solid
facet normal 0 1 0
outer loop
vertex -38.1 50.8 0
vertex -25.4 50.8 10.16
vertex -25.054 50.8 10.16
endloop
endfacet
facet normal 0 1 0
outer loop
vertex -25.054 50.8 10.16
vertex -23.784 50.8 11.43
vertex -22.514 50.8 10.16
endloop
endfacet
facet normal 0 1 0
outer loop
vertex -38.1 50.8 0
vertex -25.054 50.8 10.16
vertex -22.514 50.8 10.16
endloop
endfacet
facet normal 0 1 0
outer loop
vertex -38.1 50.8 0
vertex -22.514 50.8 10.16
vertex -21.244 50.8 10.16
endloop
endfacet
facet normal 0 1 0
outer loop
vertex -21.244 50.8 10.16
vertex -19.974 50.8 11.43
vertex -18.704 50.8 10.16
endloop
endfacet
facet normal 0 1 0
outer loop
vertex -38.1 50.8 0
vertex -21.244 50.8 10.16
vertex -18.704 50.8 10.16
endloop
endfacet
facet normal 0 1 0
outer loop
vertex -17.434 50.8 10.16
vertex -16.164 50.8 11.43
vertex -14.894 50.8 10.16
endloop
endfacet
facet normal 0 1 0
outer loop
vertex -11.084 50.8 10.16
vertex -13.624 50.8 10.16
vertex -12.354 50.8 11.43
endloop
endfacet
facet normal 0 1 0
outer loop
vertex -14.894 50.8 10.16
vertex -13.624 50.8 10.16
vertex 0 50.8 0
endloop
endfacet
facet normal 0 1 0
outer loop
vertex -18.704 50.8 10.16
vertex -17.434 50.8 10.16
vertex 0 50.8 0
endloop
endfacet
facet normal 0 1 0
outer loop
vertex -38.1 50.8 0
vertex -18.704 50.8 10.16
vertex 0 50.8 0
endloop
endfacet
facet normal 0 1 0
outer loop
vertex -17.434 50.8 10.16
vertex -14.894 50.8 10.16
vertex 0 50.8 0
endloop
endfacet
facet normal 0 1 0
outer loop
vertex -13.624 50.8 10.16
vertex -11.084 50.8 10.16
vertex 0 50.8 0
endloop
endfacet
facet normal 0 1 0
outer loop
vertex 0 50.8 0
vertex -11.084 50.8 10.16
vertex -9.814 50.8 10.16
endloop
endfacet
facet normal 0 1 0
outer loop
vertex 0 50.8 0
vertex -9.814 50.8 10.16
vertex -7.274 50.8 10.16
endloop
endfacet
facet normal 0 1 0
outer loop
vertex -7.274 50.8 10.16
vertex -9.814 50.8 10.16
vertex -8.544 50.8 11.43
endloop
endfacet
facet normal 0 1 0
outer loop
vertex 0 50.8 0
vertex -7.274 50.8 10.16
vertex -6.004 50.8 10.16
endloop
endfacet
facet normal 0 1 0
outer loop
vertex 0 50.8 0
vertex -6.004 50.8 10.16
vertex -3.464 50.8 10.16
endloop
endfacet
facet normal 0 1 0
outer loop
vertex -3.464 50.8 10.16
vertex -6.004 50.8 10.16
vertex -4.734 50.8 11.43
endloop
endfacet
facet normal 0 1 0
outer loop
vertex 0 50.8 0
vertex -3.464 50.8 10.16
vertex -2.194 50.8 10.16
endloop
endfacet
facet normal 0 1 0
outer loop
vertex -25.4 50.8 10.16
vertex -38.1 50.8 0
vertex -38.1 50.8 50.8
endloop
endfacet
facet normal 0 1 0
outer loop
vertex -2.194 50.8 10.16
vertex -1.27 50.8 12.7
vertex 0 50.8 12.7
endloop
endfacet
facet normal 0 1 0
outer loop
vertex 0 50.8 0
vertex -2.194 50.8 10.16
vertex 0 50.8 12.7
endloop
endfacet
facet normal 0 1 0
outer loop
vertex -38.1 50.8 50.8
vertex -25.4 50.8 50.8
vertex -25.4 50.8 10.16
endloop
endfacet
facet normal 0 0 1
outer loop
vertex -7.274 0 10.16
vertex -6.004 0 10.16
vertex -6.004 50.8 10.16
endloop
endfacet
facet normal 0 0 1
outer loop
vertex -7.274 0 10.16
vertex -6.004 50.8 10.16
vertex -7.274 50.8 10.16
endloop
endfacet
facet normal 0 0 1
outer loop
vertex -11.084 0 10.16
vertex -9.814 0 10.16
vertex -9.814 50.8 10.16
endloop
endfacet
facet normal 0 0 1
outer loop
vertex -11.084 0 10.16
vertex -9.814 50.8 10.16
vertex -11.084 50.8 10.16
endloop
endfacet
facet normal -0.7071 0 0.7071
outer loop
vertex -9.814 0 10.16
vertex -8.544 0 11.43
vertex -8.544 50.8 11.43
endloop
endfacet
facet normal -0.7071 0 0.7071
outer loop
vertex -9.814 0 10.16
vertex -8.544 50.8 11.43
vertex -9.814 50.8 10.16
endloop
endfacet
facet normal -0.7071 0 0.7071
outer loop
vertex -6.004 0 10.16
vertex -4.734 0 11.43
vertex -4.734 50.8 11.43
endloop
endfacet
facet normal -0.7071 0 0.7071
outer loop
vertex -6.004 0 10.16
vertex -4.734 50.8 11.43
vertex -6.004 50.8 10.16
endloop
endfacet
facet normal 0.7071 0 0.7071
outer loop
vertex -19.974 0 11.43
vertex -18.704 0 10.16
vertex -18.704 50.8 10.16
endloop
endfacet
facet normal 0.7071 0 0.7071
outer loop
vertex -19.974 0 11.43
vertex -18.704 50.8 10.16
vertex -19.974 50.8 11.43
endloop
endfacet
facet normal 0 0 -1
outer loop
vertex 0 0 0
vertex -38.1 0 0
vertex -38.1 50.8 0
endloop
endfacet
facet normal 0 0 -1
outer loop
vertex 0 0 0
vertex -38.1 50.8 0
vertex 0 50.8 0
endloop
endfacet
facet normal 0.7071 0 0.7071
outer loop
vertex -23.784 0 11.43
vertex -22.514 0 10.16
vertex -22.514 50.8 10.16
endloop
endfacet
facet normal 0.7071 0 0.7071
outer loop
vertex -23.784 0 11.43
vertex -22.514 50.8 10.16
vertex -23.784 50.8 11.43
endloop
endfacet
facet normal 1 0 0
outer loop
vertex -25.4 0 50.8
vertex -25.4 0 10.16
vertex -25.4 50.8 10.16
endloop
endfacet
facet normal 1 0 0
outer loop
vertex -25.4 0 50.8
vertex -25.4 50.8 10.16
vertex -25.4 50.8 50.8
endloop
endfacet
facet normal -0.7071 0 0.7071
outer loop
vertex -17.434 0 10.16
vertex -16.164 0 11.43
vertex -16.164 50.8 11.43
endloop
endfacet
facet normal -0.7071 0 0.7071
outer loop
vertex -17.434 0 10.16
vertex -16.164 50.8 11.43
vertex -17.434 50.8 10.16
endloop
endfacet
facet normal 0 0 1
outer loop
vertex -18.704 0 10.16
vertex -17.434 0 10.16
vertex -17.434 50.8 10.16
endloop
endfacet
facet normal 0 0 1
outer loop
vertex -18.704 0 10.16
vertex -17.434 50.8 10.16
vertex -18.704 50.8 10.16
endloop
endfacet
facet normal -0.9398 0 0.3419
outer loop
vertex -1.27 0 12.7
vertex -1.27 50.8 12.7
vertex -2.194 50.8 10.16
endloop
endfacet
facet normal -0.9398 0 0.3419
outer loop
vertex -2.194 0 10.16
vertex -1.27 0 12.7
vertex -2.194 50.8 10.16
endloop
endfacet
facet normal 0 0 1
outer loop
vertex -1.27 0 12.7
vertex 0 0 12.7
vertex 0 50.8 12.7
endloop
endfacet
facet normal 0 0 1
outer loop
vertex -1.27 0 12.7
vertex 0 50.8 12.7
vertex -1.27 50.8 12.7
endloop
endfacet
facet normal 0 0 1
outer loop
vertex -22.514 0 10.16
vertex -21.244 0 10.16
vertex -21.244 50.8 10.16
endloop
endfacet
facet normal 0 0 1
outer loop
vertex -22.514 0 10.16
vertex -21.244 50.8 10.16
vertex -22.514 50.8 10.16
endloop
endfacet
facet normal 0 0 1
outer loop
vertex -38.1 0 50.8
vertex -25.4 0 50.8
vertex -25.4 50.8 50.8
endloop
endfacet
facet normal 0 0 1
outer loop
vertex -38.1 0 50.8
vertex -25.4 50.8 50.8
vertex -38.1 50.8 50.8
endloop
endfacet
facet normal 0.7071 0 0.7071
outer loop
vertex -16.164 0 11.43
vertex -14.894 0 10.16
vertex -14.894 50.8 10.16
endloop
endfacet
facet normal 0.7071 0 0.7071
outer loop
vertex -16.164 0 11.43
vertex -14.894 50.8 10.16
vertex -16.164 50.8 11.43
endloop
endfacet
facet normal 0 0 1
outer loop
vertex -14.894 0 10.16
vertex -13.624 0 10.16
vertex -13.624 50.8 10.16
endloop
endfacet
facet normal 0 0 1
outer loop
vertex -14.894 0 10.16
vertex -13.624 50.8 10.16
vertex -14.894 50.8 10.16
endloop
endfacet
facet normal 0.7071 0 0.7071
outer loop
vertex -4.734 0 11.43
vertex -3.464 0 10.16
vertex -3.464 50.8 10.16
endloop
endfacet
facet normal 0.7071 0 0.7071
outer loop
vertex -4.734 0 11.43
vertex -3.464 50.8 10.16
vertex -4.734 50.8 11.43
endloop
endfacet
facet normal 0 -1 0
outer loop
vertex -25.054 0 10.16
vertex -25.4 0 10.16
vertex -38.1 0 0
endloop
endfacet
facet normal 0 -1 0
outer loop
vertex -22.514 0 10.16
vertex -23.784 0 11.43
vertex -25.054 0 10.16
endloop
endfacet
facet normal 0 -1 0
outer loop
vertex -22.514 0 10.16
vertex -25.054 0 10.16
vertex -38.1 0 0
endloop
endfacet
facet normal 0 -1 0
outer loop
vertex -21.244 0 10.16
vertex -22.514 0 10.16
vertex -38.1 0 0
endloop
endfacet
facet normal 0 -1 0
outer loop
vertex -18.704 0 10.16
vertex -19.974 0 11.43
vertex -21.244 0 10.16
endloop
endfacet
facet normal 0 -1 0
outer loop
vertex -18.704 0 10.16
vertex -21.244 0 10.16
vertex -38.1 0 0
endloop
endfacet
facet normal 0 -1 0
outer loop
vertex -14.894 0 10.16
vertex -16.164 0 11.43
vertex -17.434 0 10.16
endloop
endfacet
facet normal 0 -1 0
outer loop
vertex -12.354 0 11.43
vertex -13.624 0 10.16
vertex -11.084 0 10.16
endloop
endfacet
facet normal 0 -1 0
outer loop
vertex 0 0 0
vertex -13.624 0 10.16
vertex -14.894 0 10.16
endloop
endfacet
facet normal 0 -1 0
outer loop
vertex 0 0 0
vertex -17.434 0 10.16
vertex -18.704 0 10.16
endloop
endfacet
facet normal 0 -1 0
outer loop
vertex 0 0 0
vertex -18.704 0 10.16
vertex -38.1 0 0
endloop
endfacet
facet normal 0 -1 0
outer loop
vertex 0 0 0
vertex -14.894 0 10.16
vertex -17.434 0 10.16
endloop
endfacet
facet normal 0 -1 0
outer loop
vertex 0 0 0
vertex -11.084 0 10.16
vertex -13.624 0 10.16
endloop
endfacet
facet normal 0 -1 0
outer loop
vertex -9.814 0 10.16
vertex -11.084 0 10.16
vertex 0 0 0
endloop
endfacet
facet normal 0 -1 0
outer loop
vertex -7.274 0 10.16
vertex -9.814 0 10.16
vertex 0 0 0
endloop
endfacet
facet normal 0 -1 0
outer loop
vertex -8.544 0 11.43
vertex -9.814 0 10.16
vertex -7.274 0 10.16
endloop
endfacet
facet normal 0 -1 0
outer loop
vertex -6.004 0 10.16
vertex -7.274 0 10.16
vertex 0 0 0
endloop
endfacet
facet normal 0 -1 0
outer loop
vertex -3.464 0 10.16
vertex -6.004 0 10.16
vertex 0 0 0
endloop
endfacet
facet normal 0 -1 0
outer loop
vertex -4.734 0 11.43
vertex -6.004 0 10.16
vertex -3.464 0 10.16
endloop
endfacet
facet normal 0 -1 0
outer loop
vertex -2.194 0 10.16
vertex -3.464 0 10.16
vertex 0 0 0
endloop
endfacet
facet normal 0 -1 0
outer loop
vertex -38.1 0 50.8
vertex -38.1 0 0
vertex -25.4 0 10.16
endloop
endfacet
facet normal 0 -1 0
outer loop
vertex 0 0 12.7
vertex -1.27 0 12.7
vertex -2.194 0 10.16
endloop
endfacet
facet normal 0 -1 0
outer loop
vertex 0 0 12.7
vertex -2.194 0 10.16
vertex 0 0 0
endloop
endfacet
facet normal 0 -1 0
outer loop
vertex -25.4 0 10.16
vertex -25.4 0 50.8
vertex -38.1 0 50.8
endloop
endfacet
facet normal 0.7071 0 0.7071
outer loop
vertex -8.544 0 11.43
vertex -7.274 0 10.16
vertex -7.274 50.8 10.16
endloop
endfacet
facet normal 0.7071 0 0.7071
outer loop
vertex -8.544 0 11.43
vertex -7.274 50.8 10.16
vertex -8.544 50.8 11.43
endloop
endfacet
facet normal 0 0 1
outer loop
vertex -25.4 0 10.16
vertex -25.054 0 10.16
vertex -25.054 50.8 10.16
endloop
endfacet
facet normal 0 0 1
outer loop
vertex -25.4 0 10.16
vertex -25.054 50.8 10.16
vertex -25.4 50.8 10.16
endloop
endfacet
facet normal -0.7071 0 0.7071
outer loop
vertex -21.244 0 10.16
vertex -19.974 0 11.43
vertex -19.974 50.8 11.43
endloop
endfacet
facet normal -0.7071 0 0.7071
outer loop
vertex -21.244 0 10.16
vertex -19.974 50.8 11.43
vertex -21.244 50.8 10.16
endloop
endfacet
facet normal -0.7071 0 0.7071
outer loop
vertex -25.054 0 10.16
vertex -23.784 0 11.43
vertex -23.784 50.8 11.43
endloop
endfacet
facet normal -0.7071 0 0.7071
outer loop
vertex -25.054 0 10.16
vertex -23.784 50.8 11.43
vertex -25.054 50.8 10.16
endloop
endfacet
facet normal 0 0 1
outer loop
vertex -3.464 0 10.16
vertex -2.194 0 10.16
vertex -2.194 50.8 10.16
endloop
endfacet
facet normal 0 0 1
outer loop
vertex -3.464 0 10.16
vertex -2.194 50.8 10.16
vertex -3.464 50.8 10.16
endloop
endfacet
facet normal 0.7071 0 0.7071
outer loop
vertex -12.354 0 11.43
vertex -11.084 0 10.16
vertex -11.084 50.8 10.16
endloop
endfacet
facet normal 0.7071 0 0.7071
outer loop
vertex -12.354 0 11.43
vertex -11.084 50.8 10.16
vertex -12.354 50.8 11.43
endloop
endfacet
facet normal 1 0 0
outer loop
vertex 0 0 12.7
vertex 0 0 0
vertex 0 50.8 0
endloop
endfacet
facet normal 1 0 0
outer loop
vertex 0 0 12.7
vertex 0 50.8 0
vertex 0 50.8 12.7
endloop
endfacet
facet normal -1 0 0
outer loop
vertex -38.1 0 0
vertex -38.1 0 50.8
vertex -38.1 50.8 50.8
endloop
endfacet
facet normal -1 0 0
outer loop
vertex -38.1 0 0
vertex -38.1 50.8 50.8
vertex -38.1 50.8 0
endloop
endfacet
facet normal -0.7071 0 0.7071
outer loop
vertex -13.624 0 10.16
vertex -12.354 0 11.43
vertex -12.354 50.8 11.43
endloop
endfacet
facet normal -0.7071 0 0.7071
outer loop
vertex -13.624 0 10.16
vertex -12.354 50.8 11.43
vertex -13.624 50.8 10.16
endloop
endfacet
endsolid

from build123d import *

# Parameters (mm, degrees)
F1_DEPTH = 50.8


with BuildPart() as f1:
    # F0 (on Front) → F1 (new body)
    with BuildSketch(Plane.XZ):
        Polygon((-38.1, 0), (0, 0), (0, 12.7), (-1.27, 12.7), (-2.194484, 10.16), (-3.464484, 10.16), (-4.734484, 11.43), (-6.004484, 10.16), (-7.274484, 10.16), (-8.544484, 11.43), (-9.814484, 10.16), (-11.084484, 10.16), (-12.354484, 11.43), (-13.624484, 10.16), (-14.894484, 10.16), (-16.164484, 11.43), (-17.434484, 10.16), (-18.704484, 10.16), (-19.974484, 11.43), (-21.244484, 10.16), (-22.514484, 10.16), (-23.784484, 11.43), (-25.054484, 10.16), (-25.4, 10.16), (-25.4, 50.8), (-38.1, 50.8), align=None)
    extrude(amount=-F1_DEPTH)


solid = f1.part
